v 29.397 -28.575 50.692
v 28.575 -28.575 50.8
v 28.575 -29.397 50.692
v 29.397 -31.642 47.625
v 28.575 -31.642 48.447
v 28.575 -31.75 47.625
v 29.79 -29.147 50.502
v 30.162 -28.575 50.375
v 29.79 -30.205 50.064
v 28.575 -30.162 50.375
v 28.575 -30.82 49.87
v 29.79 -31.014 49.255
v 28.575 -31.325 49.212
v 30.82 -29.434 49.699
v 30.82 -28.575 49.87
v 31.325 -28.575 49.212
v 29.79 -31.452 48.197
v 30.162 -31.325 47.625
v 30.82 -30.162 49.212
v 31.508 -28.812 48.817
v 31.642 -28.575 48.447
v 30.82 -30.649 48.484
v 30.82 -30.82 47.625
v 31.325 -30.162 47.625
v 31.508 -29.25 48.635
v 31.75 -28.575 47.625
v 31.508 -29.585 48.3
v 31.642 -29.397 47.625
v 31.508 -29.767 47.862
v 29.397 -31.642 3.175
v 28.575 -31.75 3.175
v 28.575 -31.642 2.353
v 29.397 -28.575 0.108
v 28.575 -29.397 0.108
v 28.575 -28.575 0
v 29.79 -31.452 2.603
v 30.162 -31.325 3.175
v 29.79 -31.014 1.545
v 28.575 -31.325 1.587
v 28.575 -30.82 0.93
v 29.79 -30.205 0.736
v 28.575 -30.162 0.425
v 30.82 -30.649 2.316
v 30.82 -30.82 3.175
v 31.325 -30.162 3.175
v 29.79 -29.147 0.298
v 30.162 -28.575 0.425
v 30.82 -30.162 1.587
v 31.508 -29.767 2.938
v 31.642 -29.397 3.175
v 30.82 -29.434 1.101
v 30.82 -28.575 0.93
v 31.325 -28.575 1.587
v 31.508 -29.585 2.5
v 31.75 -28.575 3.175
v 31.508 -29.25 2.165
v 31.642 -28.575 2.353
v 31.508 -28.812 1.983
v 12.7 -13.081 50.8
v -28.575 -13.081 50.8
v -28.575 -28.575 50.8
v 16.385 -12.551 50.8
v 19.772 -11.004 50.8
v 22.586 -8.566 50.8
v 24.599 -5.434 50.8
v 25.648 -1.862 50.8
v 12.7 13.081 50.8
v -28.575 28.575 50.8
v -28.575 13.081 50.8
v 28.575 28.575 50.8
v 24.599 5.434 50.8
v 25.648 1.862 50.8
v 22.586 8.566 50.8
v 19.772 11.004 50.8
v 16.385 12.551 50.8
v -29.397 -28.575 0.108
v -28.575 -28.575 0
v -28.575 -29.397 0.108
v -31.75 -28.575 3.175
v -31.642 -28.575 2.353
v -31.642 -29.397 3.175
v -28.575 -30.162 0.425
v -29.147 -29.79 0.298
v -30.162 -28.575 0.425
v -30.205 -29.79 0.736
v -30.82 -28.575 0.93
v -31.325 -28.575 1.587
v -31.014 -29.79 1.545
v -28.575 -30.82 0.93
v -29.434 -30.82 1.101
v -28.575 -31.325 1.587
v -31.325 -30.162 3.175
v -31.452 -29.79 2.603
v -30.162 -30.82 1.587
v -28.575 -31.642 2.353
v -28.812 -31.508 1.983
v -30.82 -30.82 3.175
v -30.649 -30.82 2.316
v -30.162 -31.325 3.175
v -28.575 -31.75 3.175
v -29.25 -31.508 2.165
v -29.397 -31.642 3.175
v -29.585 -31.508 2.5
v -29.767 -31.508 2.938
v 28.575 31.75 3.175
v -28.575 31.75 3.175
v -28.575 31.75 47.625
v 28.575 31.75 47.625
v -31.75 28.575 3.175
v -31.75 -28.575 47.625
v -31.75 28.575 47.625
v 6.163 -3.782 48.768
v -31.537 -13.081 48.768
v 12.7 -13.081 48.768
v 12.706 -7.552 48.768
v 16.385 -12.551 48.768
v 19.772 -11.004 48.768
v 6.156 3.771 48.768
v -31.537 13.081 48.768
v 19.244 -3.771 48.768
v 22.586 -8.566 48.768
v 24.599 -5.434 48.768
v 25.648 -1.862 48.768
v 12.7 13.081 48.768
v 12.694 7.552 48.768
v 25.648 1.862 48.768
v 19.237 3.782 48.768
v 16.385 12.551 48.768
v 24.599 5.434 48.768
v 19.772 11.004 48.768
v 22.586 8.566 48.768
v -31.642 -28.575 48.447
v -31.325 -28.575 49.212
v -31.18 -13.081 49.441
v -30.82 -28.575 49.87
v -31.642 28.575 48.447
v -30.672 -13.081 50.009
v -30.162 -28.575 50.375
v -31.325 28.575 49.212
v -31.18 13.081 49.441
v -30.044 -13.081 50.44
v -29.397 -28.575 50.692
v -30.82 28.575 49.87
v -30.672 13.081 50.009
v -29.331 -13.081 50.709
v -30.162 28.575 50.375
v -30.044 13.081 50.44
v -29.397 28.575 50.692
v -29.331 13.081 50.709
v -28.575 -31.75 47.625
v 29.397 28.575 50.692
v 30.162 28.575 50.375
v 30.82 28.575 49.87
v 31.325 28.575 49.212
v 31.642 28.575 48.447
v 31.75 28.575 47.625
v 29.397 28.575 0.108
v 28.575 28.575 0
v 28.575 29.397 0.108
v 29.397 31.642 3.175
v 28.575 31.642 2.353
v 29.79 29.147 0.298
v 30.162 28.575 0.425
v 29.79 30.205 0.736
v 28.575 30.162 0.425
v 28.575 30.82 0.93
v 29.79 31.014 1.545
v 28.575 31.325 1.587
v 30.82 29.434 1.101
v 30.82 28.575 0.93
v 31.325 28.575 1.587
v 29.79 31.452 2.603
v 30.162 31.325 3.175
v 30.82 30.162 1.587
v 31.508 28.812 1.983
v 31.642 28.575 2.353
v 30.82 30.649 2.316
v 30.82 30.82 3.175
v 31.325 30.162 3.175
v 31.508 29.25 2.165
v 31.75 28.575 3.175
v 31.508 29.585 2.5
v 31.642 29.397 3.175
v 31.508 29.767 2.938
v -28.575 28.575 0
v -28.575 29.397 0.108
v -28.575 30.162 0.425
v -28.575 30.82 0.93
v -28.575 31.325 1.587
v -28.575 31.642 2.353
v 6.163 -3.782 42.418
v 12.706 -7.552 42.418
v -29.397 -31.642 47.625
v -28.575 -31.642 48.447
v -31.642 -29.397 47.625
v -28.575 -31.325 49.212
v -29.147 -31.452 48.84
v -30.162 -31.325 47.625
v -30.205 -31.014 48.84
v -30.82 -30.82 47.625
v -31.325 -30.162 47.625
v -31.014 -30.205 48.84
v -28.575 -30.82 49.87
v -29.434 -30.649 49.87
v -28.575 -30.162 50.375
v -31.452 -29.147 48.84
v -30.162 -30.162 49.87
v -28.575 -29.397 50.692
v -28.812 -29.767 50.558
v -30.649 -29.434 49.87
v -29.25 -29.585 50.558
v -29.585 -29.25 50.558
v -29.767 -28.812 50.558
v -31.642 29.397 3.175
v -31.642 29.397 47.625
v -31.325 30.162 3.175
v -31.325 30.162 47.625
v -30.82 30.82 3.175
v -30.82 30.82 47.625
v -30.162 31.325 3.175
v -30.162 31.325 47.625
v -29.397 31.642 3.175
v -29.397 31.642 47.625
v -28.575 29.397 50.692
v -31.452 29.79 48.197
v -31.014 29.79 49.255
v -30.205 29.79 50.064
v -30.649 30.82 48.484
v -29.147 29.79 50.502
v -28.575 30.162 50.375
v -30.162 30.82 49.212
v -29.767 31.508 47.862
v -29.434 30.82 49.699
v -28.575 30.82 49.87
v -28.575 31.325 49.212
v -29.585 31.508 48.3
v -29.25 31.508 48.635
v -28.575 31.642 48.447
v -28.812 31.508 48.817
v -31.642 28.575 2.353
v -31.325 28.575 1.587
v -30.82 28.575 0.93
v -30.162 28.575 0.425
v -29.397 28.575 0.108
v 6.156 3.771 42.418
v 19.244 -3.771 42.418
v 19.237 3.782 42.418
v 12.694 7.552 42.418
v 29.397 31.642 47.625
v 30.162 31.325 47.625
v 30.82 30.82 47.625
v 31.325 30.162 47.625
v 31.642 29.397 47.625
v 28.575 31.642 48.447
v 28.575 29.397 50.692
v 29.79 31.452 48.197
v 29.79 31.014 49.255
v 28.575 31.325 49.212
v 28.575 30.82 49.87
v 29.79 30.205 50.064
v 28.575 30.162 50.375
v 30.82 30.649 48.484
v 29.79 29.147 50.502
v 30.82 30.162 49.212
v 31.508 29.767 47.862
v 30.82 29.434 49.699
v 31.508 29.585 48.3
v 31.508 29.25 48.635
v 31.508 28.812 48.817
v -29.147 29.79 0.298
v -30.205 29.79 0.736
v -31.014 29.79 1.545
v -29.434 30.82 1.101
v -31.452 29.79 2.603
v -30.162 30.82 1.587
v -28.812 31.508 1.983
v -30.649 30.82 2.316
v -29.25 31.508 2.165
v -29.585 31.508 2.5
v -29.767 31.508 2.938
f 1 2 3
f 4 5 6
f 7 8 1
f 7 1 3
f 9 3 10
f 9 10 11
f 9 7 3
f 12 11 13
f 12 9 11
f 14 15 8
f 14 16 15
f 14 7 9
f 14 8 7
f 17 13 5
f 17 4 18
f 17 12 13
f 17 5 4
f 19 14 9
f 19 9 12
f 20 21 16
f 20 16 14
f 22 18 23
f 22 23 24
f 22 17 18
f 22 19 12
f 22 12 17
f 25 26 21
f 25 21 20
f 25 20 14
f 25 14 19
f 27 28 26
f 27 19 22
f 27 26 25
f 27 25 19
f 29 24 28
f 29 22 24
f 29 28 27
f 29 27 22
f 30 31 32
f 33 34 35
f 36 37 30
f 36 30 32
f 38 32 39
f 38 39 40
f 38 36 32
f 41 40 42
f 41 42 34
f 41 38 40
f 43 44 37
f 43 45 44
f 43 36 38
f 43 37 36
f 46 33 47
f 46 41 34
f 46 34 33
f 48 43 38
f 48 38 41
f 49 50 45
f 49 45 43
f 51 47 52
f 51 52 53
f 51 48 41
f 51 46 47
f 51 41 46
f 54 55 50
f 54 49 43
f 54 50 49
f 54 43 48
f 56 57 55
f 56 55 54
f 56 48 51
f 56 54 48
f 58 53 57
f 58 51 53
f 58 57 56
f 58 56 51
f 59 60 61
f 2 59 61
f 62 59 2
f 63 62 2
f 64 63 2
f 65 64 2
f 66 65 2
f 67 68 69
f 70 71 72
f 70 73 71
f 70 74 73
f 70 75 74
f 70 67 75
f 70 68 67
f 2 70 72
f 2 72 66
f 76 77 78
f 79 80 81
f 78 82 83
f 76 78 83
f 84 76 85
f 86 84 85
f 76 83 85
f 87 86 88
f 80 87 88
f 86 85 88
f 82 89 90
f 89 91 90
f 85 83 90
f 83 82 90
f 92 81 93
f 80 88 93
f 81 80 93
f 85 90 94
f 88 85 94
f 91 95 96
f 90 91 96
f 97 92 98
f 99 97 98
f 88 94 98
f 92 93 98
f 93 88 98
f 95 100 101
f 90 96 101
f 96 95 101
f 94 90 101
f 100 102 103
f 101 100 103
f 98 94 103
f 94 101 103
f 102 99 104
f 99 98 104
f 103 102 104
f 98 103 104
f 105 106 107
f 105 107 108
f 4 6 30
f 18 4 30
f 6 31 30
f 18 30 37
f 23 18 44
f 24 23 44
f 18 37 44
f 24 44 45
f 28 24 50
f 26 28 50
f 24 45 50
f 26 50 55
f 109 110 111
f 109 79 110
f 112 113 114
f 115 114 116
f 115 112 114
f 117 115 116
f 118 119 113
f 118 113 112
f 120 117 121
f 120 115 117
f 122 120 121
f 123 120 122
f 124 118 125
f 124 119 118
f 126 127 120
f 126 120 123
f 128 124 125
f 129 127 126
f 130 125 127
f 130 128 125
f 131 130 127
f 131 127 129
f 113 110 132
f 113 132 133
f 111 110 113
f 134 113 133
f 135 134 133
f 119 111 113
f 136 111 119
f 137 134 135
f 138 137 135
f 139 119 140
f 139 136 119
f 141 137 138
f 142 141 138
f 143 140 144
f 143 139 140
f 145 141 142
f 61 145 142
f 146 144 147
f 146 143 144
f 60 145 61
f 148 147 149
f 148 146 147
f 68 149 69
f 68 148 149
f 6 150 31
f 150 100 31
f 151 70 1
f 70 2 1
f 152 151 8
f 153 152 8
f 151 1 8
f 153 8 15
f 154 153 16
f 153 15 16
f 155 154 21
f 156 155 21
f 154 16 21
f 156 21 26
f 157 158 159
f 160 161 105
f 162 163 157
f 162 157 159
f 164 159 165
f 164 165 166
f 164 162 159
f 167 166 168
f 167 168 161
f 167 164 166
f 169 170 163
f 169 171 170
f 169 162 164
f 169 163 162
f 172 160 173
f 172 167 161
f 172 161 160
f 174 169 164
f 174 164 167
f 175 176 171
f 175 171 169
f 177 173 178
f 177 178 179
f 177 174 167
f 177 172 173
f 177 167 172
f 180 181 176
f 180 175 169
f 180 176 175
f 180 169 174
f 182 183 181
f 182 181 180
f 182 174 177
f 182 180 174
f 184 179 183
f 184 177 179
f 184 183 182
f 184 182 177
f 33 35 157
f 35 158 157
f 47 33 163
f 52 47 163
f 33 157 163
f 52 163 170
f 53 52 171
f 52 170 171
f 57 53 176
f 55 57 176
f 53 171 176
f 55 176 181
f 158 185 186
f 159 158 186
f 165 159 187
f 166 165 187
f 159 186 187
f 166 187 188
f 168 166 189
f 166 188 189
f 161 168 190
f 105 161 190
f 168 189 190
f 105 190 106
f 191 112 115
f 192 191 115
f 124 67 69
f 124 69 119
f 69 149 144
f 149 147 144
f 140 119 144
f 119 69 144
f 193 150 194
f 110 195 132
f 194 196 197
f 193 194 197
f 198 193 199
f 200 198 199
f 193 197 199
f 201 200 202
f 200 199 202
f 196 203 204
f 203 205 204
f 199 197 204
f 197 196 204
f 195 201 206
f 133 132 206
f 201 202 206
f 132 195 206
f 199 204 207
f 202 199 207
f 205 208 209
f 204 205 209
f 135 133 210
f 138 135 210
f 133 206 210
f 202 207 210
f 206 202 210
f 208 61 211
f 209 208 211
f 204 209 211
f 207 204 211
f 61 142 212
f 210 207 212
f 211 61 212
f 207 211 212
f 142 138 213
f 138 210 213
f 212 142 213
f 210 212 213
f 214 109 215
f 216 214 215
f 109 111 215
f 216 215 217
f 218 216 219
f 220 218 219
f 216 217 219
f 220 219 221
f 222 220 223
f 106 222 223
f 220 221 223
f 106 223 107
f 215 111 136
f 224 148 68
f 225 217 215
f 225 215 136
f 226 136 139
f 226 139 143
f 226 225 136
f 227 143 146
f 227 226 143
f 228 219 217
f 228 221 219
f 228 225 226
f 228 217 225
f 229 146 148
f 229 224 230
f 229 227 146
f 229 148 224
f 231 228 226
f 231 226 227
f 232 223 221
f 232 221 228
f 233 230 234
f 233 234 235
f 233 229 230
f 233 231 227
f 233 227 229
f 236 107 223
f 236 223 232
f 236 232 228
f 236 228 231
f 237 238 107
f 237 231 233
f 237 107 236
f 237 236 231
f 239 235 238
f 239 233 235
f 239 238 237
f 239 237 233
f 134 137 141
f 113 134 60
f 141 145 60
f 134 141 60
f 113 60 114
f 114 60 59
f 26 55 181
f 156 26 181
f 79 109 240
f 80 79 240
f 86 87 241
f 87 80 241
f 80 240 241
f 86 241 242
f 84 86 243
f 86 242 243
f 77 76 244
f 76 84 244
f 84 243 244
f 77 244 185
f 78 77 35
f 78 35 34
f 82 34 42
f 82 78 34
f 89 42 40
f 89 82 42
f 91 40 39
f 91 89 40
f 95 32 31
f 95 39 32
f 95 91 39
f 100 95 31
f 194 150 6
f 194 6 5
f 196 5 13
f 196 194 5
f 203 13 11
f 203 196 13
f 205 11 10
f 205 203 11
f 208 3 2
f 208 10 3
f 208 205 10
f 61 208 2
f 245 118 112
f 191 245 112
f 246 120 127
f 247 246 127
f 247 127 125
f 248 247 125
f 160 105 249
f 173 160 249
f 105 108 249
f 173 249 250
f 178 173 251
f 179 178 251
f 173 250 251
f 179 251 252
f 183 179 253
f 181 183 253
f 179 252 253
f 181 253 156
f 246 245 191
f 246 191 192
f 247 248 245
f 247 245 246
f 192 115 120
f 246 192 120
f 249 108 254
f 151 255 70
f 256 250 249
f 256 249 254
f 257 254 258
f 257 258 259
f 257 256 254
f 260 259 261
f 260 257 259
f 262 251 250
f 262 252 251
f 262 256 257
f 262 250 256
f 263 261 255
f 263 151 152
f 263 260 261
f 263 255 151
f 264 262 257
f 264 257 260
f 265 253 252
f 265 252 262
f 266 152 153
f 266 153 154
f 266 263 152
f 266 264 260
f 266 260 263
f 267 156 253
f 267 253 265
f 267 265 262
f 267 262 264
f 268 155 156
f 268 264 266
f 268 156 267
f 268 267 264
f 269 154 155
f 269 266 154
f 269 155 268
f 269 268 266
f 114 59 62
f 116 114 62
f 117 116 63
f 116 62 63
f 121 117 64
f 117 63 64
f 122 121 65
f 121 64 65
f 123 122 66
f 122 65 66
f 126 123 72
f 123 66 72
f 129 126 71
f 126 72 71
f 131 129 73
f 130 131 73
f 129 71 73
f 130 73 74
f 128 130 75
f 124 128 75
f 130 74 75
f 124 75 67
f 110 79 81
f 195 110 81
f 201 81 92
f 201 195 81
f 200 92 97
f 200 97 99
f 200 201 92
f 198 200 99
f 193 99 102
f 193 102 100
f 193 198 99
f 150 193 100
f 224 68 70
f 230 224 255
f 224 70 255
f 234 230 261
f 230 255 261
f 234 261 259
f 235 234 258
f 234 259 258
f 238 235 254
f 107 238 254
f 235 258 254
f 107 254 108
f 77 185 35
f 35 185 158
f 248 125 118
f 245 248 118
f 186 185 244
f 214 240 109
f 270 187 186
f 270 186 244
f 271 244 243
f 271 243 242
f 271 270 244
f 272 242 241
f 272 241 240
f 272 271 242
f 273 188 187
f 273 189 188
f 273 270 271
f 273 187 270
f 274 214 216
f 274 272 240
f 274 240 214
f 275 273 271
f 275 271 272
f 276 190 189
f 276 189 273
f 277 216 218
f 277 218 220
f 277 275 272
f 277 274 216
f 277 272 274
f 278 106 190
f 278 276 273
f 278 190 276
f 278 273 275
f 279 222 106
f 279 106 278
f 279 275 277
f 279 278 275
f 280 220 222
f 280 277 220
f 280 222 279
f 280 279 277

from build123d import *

# Parameters (mm, degrees)
F0_W     = 63.5
F0_H     = 63.5
F1_DEPTH = 50.8
F4_DEPTH = 2.032
F2_W     = 1.5281873676
F2_H     = 5.9584317987
F5_DEPTH = 8.382
F6_F1_R  = 3.175
F6_F2_R  = 3.175
F6_F3_R  = 3.175
F6_F4_R  = 3.175
F6_F5_R  = 3.175


with BuildPart() as f1:
    # F0 (on Top) → F1 (new body)
    with BuildSketch(Plane.XY):
        Rectangle(F0_W, F0_H)
    extrude(amount=F1_DEPTH)

    # F3 (on face) → F4 (cut)
    with BuildSketch(Plane.XY.offset(50.8)):
        with BuildLine():
            Line((-31.75, -13.081), (12.7, -13.081))
            ThreePointArc((12.7, -13.081), (25.781, 0), (12.7, 13.081))
            Line((12.7, 13.081), (-31.75, 13.081))
            Line((-31.75, 13.081), (-31.75, -13.081))
        make_face()
        Polygon((12.7063958977, -7.552316163), (6.1627002943, -3.7816970914), (6.1563043966, 3.7706190716), (12.6936041023, 7.552316163), (19.2372997057, 3.7816970914), (19.2436956034, -3.7706190716), align=None, mode=Mode.SUBTRACT)
    extrude(amount=-F4_DEPTH, mode=Mode.SUBTRACT)

    # F2 (on face) → F5 (cut)
    with BuildSketch(Plane.XY.offset(50.8)):
        with Locations((145.2675004168, 51.4206579864)):
            Rectangle(F2_W, F2_H)
        Polygon((12.6936041023, 7.552316163), (6.1563043966, 3.7706190716), (6.1627002943, -3.7816970914), (12.7063958977, -7.552316163), (19.2436956034, -3.7706190716), (19.2372997057, 3.7816970914), align=None)
    extrude(amount=-F5_DEPTH, mode=Mode.SUBTRACT)

    # F6: fillet of radius 3.175 on 13 edges, made by hand

    # F6_f1
    f6_f1_edges = [f1.edges().sort_by_distance(p)[0] for p in [
        (-31.75, 0, 0),
    ]]
    fillet(f6_f1_edges, radius=F6_F1_R)

    # F6_f2
    f6_f2_edges = [f1.edges().sort_by_distance(p)[0] for p in [
        (-31.75, -31.75, 26.9875),
    ]]
    fillet(f6_f2_edges, radius=F6_F2_R)

    # F6_f3
    f6_f3_edges = [f1.edges().sort_by_distance(p)[0] for p in [
        (-31.75, -20.828, 50.8),
    ]]
    fillet(f6_f3_edges, radius=F6_F3_R)

    # F6_f4
    f6_f4_edges = [f1.edges().sort_by_distance(p)[0] for p in [
        (-31.75, 31.75, 25.4),
    ]]
    fillet(f6_f4_edges, radius=F6_F4_R)

    # F6_f5
    f6_f5_edges = [f1.edges().sort_by_distance(p)[0] for p in [
        (31.75, 0, 0),
    ]]
    fillet(f6_f5_edges, radius=F6_F5_R)


solid = f1.part
